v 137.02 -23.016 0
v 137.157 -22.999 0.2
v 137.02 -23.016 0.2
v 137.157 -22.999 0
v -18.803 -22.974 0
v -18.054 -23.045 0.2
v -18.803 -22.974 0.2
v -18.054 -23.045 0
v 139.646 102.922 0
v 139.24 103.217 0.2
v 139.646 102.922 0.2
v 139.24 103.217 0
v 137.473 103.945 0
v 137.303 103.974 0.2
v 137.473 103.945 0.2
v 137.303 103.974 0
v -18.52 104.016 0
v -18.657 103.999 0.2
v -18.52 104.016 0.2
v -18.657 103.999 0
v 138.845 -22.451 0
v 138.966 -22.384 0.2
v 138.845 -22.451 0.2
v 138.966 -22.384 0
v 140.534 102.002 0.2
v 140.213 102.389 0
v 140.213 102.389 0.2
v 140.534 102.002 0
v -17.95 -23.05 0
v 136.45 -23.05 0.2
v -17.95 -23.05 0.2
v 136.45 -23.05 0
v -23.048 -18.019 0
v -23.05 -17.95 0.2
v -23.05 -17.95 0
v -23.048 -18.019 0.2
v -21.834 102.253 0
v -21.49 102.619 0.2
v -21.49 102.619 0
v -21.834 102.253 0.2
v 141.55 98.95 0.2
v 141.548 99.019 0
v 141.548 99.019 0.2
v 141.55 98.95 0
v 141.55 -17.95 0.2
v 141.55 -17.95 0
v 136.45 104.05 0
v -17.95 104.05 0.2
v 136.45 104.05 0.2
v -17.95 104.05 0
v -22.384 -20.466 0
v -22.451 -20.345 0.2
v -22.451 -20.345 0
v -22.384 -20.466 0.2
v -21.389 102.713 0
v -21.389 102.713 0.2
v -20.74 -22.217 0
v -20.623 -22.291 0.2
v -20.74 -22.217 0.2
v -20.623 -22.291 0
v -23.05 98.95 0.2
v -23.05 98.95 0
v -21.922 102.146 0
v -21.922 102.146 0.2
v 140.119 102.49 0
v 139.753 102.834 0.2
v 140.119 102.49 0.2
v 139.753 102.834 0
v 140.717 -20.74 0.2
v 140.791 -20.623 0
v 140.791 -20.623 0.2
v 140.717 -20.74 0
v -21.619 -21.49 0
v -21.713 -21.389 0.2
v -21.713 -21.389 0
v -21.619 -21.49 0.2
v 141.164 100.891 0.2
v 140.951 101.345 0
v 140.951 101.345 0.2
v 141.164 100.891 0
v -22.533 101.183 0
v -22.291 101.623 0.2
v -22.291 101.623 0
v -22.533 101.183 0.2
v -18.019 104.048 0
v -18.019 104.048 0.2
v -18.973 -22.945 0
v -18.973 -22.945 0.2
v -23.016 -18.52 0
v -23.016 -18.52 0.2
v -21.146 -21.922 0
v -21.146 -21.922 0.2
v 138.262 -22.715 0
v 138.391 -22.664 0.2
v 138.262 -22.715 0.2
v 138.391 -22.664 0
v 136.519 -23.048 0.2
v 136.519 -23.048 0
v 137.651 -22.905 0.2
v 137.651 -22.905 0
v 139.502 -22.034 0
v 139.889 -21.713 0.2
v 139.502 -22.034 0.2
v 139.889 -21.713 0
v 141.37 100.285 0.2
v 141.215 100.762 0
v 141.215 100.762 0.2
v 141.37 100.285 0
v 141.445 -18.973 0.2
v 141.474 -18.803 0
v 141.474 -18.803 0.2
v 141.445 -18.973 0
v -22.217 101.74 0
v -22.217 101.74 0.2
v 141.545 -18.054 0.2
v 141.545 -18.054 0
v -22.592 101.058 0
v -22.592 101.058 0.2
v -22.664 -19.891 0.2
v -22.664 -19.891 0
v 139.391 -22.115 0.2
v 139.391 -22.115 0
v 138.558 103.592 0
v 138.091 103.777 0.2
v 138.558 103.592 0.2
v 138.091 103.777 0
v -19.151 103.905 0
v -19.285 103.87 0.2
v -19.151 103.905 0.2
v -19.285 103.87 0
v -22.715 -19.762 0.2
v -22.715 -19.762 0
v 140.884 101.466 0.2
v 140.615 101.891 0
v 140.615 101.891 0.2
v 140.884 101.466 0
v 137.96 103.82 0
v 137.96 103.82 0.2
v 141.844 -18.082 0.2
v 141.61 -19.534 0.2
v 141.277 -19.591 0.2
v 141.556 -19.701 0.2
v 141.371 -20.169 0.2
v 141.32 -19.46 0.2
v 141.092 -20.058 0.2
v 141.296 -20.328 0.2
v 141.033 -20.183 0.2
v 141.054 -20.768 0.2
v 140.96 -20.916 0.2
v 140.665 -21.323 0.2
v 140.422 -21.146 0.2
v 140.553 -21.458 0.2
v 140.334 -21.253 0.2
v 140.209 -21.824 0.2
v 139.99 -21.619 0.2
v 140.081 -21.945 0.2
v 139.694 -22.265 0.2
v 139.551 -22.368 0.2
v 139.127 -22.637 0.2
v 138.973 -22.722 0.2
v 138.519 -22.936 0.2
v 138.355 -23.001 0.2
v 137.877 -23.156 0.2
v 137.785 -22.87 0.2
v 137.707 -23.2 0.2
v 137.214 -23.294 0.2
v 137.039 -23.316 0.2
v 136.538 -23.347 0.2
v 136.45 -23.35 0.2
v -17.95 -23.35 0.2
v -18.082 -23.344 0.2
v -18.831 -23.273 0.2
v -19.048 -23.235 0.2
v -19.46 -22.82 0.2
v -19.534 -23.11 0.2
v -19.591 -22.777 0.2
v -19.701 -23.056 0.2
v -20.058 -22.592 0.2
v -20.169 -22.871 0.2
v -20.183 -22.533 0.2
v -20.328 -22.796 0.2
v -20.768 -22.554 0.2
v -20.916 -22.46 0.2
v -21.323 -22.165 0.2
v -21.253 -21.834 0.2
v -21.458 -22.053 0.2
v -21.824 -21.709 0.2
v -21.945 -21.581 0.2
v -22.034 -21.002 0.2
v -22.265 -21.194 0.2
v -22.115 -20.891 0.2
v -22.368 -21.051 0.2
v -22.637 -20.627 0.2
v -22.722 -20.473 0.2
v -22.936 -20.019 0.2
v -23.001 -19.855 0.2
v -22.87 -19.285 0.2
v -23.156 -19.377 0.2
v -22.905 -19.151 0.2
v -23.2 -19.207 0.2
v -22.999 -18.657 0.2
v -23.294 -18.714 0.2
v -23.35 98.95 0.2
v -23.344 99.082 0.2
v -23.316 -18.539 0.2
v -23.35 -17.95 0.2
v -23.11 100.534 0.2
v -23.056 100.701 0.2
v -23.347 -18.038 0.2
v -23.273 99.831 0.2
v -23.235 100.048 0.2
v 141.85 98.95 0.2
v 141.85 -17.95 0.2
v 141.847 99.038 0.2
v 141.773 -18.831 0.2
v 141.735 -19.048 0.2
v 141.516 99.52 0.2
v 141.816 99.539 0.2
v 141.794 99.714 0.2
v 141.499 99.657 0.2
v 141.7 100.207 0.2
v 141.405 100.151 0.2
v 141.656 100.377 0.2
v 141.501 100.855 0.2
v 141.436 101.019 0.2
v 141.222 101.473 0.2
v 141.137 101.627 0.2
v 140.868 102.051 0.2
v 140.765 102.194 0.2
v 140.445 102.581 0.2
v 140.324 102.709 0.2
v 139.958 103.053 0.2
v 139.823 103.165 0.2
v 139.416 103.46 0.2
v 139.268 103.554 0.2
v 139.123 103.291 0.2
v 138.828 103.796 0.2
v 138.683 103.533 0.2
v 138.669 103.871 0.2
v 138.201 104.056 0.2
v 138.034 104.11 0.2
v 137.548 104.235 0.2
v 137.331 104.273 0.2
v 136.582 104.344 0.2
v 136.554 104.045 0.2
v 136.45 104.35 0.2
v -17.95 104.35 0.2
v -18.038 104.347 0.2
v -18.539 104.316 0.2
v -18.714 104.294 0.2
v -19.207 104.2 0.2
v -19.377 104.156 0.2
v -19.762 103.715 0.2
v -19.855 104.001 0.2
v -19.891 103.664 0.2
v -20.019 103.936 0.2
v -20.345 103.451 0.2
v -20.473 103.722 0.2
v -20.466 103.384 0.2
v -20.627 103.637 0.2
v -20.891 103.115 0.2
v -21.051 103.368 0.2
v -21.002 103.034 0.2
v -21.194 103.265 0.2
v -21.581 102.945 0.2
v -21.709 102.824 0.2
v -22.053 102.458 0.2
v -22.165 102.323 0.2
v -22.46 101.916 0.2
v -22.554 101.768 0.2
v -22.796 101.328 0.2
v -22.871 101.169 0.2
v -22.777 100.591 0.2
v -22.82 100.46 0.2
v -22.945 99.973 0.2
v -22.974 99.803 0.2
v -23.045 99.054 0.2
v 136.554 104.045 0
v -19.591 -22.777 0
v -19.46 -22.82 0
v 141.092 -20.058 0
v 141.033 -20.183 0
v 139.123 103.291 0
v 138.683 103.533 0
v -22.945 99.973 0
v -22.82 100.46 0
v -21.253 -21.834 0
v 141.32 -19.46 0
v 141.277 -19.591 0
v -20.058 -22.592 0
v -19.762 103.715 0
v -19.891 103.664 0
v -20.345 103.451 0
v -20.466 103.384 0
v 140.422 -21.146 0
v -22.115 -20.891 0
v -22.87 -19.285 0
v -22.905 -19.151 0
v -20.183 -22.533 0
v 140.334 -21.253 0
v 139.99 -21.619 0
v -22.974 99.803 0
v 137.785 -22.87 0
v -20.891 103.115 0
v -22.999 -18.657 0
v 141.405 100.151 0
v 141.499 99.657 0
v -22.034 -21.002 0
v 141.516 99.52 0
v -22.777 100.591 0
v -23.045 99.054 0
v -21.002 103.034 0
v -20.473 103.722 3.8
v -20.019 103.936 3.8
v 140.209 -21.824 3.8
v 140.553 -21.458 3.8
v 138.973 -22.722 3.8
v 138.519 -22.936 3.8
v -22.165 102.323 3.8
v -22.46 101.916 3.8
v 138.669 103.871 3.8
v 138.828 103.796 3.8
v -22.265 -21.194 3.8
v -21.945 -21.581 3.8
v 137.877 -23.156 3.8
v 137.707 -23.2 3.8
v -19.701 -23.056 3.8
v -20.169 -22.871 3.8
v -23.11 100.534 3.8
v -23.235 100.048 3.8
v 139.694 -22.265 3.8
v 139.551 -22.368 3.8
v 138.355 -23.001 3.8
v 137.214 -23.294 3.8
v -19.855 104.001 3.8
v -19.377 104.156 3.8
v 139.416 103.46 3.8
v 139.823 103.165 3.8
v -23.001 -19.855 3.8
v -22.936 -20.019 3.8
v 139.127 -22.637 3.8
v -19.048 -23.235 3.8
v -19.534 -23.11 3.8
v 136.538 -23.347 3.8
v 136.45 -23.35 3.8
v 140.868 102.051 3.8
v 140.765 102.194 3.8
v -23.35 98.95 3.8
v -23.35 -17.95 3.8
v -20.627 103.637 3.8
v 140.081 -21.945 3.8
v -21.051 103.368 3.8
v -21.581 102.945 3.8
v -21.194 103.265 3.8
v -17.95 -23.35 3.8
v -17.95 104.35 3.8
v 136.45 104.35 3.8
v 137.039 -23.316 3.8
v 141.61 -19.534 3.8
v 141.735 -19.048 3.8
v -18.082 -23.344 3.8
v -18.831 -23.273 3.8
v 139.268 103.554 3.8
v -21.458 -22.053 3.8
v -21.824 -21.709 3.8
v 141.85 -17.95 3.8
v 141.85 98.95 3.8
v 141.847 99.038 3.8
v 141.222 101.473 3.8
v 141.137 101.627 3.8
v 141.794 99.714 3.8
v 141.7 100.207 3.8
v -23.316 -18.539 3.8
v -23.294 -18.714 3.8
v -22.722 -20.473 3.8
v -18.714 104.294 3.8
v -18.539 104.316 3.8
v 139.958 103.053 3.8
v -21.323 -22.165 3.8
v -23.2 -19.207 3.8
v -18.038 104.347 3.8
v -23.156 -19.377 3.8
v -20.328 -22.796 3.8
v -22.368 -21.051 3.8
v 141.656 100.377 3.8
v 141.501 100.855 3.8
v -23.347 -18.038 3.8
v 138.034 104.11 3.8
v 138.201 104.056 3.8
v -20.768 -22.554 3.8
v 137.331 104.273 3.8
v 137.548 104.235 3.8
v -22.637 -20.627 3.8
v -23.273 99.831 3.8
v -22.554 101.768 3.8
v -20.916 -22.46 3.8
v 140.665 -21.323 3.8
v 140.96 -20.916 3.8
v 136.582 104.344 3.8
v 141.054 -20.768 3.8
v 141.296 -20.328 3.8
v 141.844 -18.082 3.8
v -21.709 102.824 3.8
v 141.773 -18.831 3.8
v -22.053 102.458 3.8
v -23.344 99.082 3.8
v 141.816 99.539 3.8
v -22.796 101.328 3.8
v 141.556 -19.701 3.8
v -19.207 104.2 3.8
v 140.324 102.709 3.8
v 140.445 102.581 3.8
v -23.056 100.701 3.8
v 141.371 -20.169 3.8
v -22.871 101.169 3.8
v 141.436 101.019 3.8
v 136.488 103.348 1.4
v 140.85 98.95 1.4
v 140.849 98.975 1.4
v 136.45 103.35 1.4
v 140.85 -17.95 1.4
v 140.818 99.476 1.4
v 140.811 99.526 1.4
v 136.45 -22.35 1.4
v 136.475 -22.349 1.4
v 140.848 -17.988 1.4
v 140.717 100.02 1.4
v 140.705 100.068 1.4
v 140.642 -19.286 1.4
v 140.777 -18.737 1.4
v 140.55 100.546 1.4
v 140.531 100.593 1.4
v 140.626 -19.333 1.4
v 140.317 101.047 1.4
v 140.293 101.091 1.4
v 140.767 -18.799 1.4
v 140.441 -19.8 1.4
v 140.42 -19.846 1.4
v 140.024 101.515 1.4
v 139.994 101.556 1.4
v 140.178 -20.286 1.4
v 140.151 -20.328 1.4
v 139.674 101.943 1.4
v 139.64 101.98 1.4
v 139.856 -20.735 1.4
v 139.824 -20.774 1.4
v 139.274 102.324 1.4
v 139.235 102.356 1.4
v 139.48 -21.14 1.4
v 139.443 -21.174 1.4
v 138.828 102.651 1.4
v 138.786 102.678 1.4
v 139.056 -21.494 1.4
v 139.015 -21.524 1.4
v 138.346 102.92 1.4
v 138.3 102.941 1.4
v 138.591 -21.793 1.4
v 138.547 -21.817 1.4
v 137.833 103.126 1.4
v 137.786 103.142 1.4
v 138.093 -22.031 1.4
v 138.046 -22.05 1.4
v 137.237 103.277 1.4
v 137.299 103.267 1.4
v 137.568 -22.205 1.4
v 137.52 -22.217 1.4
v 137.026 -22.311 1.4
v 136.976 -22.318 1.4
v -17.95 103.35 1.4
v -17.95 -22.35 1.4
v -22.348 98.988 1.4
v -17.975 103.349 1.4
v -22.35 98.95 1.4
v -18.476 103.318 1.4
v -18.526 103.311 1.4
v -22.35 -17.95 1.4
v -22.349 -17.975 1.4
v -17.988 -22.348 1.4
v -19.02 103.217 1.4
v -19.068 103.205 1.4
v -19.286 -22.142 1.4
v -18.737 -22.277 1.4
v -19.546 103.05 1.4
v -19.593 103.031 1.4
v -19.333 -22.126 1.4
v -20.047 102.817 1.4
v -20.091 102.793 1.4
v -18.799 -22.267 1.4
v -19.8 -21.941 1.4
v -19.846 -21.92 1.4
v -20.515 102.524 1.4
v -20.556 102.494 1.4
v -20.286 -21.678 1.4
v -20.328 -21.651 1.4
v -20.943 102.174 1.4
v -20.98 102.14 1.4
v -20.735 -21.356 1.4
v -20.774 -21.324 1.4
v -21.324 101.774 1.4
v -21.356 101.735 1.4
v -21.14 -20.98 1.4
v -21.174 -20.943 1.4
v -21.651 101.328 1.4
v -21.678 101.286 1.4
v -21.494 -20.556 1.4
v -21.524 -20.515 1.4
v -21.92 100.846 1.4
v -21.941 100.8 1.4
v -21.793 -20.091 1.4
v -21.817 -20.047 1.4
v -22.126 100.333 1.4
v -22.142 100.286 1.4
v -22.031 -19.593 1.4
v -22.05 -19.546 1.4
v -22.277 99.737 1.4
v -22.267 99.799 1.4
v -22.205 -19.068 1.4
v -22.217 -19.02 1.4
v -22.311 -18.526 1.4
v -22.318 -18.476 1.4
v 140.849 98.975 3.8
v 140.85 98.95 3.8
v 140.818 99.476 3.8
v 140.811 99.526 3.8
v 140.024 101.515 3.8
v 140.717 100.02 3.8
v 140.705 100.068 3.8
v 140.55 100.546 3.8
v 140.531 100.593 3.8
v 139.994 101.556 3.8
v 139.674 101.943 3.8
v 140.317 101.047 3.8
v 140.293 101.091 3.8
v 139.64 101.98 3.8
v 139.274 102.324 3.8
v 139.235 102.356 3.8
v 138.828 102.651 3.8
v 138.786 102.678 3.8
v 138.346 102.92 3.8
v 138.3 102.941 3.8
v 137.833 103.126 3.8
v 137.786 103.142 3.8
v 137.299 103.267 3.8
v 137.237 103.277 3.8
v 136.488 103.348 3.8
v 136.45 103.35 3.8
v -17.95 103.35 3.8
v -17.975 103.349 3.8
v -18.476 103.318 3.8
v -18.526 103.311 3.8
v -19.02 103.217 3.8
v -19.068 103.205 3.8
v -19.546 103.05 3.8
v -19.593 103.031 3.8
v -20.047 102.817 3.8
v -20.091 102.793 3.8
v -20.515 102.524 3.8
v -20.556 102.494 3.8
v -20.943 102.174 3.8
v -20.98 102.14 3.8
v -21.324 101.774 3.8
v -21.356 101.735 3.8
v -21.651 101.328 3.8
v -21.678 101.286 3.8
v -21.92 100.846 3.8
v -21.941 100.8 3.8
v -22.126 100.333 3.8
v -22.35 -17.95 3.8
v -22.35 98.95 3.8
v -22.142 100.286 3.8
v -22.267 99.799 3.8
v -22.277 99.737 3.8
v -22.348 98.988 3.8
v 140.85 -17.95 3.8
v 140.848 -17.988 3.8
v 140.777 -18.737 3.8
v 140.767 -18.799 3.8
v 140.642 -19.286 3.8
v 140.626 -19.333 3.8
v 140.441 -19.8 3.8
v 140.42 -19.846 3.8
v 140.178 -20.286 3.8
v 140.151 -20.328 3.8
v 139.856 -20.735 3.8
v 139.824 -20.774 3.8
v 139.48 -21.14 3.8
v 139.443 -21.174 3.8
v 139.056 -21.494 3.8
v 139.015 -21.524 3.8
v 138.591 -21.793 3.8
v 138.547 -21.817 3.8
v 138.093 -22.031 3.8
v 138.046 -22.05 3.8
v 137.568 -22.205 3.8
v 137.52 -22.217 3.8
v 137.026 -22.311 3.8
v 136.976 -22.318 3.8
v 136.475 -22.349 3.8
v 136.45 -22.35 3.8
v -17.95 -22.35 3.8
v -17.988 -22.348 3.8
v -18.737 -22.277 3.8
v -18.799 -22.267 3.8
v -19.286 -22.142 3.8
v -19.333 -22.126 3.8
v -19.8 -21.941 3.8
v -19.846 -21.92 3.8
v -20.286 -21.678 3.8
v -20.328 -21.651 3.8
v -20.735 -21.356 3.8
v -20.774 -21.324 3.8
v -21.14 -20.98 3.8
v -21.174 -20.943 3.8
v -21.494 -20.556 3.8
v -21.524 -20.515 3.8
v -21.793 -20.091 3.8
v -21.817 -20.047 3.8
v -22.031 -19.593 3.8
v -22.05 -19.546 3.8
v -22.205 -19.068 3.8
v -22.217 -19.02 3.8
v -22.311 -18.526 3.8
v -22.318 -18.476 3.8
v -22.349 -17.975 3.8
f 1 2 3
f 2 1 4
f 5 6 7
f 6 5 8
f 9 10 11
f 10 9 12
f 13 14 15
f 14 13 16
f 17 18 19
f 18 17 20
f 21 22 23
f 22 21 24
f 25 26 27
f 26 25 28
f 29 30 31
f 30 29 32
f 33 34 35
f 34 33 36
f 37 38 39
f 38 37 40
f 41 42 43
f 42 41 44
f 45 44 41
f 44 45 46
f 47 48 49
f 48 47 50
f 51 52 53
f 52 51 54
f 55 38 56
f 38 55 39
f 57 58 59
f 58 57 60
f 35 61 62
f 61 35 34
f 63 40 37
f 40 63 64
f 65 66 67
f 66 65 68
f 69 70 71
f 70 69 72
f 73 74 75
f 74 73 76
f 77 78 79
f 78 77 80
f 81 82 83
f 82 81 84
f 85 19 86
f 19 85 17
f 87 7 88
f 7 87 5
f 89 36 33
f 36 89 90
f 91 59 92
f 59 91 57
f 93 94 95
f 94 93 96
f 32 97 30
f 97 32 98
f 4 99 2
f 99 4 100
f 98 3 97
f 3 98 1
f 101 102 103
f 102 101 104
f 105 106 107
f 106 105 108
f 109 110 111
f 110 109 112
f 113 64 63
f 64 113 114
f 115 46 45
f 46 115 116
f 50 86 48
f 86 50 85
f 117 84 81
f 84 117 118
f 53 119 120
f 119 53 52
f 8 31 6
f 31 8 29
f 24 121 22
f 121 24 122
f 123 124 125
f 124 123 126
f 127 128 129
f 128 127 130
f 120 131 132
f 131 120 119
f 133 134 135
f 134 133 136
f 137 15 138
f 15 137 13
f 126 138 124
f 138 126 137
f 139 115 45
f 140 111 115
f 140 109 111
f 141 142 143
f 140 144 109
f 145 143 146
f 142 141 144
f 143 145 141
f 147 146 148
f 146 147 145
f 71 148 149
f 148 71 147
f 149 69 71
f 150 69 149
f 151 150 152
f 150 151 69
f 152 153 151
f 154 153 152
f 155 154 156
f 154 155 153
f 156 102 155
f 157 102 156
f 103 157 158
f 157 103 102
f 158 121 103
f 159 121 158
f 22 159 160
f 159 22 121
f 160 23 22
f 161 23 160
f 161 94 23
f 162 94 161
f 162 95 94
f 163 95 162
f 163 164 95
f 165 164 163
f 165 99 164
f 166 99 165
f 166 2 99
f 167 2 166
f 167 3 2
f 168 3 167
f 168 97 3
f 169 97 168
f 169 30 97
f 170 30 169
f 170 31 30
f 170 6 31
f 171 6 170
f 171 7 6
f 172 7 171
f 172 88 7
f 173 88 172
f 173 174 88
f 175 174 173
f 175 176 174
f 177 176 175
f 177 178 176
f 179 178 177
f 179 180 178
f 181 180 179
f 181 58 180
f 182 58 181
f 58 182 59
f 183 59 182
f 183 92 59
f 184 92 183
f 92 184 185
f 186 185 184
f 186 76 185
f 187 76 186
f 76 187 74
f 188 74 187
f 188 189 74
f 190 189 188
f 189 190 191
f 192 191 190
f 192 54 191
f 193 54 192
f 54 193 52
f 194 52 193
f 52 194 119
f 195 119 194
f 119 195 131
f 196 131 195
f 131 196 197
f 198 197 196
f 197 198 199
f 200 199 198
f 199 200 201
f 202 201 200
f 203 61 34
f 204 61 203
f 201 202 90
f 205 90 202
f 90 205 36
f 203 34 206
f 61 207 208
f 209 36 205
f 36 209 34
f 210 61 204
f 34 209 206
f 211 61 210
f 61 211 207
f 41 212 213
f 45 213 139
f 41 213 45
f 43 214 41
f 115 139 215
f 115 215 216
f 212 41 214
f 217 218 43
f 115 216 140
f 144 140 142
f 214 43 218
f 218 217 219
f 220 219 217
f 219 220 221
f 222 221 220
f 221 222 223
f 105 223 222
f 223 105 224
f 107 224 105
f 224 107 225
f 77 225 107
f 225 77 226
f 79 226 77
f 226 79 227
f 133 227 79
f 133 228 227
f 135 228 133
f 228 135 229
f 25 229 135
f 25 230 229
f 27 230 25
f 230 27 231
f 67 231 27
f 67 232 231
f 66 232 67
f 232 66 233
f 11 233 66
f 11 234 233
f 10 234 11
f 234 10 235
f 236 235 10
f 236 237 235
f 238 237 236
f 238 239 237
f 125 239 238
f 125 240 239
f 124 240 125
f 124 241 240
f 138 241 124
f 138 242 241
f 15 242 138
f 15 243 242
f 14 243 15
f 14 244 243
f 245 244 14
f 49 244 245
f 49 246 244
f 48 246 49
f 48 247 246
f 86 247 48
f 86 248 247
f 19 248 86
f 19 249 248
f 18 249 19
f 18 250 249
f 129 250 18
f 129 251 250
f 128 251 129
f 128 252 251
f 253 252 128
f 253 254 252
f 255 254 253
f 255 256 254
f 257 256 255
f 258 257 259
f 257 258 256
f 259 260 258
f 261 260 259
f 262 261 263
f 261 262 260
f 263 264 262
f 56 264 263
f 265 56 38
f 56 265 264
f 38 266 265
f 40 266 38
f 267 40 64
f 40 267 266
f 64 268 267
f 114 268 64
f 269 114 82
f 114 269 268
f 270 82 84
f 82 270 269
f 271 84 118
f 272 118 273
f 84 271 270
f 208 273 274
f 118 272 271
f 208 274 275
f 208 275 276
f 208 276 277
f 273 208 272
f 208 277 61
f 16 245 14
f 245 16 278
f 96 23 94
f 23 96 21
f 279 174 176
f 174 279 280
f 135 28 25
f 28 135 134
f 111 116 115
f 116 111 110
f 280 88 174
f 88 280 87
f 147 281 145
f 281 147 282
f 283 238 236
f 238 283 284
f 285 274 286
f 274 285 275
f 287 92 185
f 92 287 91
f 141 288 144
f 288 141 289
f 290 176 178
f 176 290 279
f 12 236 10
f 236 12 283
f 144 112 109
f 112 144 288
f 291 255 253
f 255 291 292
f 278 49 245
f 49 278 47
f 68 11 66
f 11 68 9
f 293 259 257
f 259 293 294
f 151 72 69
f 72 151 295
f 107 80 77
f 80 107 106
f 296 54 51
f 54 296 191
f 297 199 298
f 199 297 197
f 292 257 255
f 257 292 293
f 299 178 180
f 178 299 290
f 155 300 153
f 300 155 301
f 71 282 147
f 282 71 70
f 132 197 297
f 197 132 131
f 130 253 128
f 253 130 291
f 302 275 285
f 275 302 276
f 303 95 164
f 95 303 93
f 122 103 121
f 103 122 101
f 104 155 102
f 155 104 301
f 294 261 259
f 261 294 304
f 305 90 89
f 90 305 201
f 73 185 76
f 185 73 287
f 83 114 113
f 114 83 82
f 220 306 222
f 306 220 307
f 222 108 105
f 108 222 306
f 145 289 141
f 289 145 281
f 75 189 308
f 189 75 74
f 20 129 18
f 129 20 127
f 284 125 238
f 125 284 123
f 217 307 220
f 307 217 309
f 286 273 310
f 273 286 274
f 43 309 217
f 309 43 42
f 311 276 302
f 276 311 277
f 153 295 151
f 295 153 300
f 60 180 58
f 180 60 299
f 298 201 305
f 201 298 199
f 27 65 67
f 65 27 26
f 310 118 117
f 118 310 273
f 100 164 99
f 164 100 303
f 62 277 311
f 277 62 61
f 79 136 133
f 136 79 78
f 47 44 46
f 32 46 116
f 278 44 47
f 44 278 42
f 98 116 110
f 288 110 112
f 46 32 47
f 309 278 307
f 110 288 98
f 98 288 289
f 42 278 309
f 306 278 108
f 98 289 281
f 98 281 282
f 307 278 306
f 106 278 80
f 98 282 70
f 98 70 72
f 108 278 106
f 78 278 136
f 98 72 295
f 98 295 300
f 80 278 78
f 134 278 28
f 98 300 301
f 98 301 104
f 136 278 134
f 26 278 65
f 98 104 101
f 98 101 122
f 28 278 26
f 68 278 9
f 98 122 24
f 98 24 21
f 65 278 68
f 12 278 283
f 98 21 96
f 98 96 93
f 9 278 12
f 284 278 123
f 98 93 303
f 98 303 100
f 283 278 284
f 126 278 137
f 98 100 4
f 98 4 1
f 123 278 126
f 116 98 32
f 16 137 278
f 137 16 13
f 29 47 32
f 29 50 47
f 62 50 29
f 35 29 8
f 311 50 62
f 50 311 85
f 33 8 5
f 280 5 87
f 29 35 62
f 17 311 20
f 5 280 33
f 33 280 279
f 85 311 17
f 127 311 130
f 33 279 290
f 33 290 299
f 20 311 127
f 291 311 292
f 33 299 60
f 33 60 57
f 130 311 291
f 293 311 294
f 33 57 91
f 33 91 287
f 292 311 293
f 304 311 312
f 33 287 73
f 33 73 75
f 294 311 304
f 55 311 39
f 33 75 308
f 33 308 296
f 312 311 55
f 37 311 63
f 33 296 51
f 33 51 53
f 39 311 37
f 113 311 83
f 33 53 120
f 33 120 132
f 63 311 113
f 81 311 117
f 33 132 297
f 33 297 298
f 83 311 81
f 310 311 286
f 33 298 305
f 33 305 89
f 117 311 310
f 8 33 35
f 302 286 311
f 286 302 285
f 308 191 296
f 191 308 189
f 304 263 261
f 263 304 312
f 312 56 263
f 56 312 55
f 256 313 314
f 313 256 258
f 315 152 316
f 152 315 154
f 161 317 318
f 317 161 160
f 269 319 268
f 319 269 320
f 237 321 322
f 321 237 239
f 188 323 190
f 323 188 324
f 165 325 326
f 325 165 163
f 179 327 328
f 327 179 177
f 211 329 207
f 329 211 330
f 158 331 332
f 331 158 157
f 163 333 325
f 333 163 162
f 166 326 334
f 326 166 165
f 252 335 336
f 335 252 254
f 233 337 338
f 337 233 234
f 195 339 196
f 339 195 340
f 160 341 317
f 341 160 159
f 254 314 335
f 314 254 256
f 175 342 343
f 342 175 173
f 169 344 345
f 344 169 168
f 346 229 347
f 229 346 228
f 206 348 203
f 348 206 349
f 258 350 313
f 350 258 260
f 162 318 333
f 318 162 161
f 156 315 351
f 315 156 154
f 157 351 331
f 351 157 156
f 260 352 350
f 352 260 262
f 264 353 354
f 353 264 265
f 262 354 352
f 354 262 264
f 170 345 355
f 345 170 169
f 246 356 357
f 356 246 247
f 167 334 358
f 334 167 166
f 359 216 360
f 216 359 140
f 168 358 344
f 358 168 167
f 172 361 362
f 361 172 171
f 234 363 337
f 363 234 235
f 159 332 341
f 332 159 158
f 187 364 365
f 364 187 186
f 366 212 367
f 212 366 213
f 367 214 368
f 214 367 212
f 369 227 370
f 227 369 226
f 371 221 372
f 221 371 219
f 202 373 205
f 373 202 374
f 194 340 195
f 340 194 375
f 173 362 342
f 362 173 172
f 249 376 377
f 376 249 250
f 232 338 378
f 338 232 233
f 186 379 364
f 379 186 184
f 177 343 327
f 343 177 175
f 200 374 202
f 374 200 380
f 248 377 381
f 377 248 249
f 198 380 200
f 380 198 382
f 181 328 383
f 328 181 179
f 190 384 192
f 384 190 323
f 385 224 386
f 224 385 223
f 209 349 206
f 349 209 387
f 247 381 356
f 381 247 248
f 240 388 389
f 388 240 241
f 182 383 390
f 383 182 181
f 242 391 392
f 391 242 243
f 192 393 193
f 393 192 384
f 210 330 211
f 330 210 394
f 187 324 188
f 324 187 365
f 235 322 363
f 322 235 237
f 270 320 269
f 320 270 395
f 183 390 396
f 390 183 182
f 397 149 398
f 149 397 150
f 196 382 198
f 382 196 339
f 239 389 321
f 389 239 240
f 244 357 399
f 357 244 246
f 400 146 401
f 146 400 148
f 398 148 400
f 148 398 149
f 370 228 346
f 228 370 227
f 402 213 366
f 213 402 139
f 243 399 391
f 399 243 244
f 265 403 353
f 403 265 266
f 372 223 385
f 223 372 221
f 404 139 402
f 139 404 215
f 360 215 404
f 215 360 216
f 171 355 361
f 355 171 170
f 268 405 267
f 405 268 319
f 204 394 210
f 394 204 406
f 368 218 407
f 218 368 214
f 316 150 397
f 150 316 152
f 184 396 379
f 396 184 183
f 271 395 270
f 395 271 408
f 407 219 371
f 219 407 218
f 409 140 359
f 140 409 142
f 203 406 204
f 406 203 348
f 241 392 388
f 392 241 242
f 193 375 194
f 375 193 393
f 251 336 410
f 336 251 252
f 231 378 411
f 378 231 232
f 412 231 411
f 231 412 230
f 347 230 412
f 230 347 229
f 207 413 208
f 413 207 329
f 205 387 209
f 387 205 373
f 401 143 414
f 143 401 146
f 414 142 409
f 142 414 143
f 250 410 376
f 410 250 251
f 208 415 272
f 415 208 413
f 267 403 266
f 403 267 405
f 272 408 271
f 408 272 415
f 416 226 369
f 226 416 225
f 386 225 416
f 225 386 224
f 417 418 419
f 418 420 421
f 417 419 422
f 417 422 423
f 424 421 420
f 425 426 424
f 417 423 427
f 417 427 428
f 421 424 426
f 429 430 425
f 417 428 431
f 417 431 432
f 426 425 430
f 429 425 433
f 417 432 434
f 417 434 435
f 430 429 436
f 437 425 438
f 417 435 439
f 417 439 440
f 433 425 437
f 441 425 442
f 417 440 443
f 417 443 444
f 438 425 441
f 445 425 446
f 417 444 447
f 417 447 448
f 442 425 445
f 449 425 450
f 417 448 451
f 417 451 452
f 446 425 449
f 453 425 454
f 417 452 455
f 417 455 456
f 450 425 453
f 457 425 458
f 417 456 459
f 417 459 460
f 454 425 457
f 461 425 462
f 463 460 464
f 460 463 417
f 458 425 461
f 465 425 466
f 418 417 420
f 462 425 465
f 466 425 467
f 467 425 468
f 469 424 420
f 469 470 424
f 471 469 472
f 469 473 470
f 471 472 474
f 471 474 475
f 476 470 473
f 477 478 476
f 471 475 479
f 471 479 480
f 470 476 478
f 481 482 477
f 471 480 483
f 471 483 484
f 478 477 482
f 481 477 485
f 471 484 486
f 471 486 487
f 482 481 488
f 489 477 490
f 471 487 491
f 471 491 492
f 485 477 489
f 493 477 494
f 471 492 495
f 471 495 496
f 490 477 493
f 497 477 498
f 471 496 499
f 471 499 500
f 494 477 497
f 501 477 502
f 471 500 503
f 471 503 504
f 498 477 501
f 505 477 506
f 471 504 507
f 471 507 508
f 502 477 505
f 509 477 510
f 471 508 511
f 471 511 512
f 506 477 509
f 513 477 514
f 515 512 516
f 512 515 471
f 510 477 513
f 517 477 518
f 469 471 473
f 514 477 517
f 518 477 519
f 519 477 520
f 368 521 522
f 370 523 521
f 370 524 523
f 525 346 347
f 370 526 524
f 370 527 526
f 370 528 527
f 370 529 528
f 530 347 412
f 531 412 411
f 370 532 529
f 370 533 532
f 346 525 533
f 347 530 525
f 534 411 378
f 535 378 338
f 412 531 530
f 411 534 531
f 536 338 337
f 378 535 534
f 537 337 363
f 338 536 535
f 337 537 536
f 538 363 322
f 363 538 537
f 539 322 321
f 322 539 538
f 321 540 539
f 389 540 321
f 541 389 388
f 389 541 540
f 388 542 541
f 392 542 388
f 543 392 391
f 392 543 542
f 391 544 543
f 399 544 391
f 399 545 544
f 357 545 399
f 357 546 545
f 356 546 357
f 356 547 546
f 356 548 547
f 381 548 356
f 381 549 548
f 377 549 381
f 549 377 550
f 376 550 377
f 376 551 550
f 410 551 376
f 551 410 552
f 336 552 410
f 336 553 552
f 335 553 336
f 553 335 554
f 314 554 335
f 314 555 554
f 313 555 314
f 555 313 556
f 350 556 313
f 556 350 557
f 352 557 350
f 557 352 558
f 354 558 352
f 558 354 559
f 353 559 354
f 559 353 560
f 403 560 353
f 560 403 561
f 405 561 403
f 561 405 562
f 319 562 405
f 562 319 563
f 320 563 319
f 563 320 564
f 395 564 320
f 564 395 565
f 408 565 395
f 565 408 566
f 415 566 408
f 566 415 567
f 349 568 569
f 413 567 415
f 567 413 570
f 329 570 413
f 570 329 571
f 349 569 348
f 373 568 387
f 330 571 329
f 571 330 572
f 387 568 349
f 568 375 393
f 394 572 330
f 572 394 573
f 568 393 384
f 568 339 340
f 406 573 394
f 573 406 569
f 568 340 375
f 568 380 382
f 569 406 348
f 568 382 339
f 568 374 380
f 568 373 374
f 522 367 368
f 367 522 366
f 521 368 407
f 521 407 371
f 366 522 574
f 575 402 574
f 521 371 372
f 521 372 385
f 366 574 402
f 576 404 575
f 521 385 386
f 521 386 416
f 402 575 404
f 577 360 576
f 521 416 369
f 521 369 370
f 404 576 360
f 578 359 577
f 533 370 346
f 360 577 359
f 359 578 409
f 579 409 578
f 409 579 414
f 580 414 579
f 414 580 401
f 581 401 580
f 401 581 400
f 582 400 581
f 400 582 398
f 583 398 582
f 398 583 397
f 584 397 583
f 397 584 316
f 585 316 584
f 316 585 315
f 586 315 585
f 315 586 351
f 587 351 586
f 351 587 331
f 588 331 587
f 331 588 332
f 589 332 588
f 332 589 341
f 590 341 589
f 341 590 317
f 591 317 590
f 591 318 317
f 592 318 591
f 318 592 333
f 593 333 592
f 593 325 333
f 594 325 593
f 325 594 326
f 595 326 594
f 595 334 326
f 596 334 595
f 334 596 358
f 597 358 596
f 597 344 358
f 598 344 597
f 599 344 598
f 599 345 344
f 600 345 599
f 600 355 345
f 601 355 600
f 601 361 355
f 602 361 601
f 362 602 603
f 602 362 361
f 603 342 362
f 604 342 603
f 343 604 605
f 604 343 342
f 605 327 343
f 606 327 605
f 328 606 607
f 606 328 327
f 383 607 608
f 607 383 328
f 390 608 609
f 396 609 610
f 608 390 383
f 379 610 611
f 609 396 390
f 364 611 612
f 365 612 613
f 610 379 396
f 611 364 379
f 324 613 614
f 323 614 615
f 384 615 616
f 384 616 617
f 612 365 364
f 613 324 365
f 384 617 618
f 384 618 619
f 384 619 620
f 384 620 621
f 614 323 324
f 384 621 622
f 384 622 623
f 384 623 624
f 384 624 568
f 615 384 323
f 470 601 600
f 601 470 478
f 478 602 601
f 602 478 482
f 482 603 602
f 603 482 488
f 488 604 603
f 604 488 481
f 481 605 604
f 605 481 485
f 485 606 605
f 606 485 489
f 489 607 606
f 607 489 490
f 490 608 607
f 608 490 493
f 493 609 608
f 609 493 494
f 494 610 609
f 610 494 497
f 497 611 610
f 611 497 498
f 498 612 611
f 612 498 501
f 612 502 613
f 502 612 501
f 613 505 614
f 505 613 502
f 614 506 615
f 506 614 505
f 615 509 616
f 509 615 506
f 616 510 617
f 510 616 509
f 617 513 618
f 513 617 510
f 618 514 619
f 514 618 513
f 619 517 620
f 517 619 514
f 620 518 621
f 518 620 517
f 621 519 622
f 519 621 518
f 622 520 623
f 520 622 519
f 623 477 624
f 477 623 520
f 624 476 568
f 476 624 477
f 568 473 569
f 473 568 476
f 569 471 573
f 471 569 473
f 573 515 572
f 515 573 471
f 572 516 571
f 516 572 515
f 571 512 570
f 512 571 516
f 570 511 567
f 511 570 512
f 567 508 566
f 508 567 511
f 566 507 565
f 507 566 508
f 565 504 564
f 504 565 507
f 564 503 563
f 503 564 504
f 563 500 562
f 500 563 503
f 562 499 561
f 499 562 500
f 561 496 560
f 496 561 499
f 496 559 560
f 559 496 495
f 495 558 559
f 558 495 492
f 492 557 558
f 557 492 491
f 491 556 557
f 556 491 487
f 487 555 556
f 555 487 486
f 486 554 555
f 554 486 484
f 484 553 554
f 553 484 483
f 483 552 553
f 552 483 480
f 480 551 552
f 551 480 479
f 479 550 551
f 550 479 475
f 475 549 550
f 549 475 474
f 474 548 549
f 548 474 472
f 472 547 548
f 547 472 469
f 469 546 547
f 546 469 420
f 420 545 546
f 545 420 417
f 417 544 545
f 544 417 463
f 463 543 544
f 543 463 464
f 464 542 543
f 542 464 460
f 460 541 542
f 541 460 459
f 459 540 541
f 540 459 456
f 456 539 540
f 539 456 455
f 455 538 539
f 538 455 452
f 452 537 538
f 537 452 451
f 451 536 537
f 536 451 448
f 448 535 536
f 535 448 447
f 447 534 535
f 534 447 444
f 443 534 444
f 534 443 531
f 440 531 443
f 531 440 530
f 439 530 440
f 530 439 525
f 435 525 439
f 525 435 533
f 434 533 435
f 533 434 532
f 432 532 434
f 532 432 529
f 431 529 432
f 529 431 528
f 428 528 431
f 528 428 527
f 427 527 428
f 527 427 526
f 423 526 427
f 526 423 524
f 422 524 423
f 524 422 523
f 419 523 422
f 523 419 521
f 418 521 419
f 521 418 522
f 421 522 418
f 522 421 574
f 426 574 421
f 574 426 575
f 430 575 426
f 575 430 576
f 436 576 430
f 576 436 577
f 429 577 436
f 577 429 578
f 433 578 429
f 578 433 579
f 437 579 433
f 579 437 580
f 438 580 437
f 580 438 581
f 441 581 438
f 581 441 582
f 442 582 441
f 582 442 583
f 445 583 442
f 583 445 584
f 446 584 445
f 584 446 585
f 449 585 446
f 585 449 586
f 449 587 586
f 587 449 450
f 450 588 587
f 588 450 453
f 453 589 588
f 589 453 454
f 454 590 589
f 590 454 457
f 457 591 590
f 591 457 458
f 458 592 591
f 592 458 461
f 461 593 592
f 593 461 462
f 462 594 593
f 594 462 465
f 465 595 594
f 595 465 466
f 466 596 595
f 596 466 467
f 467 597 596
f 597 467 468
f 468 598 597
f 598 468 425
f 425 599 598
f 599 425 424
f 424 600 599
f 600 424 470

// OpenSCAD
eps = 0.00001;
$fn = 50;

hole_diam = 33.5;
hole_depth = 3.2;

fence = 4.6;
rows = 3;
cols = 4;
gap = 6;
extra_gap = 1;
outer_gap = 5.2;

module gridify() {
  for (r = [1:rows], c = [1:cols])
    translate([(c-1) * (hole_diam + gap), (r-1) * (hole_diam + gap + extra_gap)])
      children();
}

module fence_2d() {
  difference() {
    gridify()
      offset(fence)
        circle(d=hole_diam);
    gridify()
      circle(d=hole_diam);
  }
}

module floor_2d() {
  roundoff = 4;
  
  offset(roundoff) offset(-roundoff) {
    translate([-hole_diam/2 - outer_gap, -hole_diam/2 - outer_gap]) {
      square([
        cols*hole_diam + (cols-1)*gap + 2*outer_gap,
        rows*hole_diam + (rows-1)*(gap+extra_gap) + 2*outer_gap
      ]);
    }
  }
}

module wall_2d() {
  wall = 1;
  
  difference() {
    floor_2d();
    offset(-wall) floor_2d();
  }
}

module main() {  
  difference() {
    color("orange")
      linear_extrude(hole_depth)
        fence_2d();

    gridify()
      translate([0, 0, hole_depth - 0.8])
        cylinder(h=1.01, d1=hole_diam, d2=hole_diam+2);
  }
  
  floor_thickness = 1;
  translate([0, 0, -floor_thickness])
    linear_extrude(0.2)
      offset(-0.6)
        floor_2d();
  translate([0, 0, 0.2-floor_thickness])
    linear_extrude(0.2)
      offset(-0.2)
        floor_2d();
  translate([0, 0, 0.4-floor_thickness])
    linear_extrude(floor_thickness-0.4)
      floor_2d();
  
  wall_height = 59;
  translate([0, 0, -eps])
    linear_extrude(wall_height)
      wall_2d();
}

module marvel() {
  color("red") {
    translate([27, -21, 18]) {
      rotate([90, 0, 0]) {
        scale([0.08, 0.08, 0.05]) {
          intersection() {
            translate([0, 0, -50])
              surface("marvel_logo.png");
            translate([0, 0, 1000])
              cube(2000, center=true);
          }
        }
      }
    }
  }
}

module lid() {
  slack = 0.4;
  edge = 1;
  
  plate = 1.4;

  linear_extrude(0.2)
    offset(edge + slack - 0.3) floor_2d();
  translate([0, 0, 0.2])
    linear_extrude(plate - 0.2)
      offset(edge + slack) floor_2d();

  translate([0, 0, plate]) {
    linear_extrude(2.4) {
      difference() {
        offset(edge + slack) floor_2d();
        offset(slack) floor_2d();
      }
    }
  }
}

lid();
